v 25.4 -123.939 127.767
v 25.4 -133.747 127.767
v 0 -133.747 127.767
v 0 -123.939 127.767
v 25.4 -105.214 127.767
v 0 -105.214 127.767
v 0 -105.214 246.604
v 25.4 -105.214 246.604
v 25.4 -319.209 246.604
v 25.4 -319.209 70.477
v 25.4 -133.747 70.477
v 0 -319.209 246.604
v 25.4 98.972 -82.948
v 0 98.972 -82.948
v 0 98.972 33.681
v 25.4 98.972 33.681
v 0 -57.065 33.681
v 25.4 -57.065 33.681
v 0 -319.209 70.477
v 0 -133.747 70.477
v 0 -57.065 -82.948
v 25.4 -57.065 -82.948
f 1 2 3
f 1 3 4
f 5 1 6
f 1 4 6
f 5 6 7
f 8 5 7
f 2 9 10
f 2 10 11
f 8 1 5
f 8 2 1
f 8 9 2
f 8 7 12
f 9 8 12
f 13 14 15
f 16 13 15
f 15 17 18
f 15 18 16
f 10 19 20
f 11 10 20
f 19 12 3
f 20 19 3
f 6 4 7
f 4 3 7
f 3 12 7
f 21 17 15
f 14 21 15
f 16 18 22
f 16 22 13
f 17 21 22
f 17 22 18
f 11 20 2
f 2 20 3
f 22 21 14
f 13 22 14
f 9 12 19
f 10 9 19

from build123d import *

# Parameters (mm, degrees)
F0_W     = 156.0377255082
F0_H     = 116.6281923652
F1_DEPTH = 25.4
F0_W_2   = 9.80810076
F0_H_2   = 40.1830375195
F0_W_3   = 78.46467942


with BuildPart() as f1:
    # F0 (on Right) → F1 (new body)
    with BuildSketch(Plane.YZ):
        with Locations((20.9536366165, -24.6335677803)):
            Rectangle(F0_W, F0_H)
    extrude(amount=F1_DEPTH)


with BuildPart() as f1b:
    # F0 (on Right) → F1, piece 2 (new body)
    with BuildSketch(Plane.YZ):
        Polygon((-123.9385381341, 127.7665048838), (-105.2140146494, 127.7665048838), (-105.2140146494, 246.6039955616), (-133.7466388941, 246.6039955616), (-133.7466388941, 167.9495424032), (-123.9385381341, 167.9495424032), align=None)
        with Locations((-128.8425885141, 147.8580236435)):
            Rectangle(F0_W_2, F0_H_2)
        Polygon((-133.7466388941, 70.476859808), (-133.7466388941, 127.7665048838), (-212.2113183141, 127.7665048838), (-319.2086219788, 127.7665048838), (-319.2086219788, 70.476859808), align=None)
        with Locations((-172.9789786041, 147.8580236435)):
            Rectangle(F0_W_3, F0_H_2)
        Polygon((-133.7466388941, 167.9495424032), (-133.7466388941, 246.6039955616), (-319.2086219788, 246.6039955616), (-319.2086219788, 127.7665048838), (-212.2113183141, 127.7665048838), (-212.2113183141, 167.9495424032), align=None)
    extrude(amount=F1_DEPTH)


solid = Compound([f1.part, f1b.part])
